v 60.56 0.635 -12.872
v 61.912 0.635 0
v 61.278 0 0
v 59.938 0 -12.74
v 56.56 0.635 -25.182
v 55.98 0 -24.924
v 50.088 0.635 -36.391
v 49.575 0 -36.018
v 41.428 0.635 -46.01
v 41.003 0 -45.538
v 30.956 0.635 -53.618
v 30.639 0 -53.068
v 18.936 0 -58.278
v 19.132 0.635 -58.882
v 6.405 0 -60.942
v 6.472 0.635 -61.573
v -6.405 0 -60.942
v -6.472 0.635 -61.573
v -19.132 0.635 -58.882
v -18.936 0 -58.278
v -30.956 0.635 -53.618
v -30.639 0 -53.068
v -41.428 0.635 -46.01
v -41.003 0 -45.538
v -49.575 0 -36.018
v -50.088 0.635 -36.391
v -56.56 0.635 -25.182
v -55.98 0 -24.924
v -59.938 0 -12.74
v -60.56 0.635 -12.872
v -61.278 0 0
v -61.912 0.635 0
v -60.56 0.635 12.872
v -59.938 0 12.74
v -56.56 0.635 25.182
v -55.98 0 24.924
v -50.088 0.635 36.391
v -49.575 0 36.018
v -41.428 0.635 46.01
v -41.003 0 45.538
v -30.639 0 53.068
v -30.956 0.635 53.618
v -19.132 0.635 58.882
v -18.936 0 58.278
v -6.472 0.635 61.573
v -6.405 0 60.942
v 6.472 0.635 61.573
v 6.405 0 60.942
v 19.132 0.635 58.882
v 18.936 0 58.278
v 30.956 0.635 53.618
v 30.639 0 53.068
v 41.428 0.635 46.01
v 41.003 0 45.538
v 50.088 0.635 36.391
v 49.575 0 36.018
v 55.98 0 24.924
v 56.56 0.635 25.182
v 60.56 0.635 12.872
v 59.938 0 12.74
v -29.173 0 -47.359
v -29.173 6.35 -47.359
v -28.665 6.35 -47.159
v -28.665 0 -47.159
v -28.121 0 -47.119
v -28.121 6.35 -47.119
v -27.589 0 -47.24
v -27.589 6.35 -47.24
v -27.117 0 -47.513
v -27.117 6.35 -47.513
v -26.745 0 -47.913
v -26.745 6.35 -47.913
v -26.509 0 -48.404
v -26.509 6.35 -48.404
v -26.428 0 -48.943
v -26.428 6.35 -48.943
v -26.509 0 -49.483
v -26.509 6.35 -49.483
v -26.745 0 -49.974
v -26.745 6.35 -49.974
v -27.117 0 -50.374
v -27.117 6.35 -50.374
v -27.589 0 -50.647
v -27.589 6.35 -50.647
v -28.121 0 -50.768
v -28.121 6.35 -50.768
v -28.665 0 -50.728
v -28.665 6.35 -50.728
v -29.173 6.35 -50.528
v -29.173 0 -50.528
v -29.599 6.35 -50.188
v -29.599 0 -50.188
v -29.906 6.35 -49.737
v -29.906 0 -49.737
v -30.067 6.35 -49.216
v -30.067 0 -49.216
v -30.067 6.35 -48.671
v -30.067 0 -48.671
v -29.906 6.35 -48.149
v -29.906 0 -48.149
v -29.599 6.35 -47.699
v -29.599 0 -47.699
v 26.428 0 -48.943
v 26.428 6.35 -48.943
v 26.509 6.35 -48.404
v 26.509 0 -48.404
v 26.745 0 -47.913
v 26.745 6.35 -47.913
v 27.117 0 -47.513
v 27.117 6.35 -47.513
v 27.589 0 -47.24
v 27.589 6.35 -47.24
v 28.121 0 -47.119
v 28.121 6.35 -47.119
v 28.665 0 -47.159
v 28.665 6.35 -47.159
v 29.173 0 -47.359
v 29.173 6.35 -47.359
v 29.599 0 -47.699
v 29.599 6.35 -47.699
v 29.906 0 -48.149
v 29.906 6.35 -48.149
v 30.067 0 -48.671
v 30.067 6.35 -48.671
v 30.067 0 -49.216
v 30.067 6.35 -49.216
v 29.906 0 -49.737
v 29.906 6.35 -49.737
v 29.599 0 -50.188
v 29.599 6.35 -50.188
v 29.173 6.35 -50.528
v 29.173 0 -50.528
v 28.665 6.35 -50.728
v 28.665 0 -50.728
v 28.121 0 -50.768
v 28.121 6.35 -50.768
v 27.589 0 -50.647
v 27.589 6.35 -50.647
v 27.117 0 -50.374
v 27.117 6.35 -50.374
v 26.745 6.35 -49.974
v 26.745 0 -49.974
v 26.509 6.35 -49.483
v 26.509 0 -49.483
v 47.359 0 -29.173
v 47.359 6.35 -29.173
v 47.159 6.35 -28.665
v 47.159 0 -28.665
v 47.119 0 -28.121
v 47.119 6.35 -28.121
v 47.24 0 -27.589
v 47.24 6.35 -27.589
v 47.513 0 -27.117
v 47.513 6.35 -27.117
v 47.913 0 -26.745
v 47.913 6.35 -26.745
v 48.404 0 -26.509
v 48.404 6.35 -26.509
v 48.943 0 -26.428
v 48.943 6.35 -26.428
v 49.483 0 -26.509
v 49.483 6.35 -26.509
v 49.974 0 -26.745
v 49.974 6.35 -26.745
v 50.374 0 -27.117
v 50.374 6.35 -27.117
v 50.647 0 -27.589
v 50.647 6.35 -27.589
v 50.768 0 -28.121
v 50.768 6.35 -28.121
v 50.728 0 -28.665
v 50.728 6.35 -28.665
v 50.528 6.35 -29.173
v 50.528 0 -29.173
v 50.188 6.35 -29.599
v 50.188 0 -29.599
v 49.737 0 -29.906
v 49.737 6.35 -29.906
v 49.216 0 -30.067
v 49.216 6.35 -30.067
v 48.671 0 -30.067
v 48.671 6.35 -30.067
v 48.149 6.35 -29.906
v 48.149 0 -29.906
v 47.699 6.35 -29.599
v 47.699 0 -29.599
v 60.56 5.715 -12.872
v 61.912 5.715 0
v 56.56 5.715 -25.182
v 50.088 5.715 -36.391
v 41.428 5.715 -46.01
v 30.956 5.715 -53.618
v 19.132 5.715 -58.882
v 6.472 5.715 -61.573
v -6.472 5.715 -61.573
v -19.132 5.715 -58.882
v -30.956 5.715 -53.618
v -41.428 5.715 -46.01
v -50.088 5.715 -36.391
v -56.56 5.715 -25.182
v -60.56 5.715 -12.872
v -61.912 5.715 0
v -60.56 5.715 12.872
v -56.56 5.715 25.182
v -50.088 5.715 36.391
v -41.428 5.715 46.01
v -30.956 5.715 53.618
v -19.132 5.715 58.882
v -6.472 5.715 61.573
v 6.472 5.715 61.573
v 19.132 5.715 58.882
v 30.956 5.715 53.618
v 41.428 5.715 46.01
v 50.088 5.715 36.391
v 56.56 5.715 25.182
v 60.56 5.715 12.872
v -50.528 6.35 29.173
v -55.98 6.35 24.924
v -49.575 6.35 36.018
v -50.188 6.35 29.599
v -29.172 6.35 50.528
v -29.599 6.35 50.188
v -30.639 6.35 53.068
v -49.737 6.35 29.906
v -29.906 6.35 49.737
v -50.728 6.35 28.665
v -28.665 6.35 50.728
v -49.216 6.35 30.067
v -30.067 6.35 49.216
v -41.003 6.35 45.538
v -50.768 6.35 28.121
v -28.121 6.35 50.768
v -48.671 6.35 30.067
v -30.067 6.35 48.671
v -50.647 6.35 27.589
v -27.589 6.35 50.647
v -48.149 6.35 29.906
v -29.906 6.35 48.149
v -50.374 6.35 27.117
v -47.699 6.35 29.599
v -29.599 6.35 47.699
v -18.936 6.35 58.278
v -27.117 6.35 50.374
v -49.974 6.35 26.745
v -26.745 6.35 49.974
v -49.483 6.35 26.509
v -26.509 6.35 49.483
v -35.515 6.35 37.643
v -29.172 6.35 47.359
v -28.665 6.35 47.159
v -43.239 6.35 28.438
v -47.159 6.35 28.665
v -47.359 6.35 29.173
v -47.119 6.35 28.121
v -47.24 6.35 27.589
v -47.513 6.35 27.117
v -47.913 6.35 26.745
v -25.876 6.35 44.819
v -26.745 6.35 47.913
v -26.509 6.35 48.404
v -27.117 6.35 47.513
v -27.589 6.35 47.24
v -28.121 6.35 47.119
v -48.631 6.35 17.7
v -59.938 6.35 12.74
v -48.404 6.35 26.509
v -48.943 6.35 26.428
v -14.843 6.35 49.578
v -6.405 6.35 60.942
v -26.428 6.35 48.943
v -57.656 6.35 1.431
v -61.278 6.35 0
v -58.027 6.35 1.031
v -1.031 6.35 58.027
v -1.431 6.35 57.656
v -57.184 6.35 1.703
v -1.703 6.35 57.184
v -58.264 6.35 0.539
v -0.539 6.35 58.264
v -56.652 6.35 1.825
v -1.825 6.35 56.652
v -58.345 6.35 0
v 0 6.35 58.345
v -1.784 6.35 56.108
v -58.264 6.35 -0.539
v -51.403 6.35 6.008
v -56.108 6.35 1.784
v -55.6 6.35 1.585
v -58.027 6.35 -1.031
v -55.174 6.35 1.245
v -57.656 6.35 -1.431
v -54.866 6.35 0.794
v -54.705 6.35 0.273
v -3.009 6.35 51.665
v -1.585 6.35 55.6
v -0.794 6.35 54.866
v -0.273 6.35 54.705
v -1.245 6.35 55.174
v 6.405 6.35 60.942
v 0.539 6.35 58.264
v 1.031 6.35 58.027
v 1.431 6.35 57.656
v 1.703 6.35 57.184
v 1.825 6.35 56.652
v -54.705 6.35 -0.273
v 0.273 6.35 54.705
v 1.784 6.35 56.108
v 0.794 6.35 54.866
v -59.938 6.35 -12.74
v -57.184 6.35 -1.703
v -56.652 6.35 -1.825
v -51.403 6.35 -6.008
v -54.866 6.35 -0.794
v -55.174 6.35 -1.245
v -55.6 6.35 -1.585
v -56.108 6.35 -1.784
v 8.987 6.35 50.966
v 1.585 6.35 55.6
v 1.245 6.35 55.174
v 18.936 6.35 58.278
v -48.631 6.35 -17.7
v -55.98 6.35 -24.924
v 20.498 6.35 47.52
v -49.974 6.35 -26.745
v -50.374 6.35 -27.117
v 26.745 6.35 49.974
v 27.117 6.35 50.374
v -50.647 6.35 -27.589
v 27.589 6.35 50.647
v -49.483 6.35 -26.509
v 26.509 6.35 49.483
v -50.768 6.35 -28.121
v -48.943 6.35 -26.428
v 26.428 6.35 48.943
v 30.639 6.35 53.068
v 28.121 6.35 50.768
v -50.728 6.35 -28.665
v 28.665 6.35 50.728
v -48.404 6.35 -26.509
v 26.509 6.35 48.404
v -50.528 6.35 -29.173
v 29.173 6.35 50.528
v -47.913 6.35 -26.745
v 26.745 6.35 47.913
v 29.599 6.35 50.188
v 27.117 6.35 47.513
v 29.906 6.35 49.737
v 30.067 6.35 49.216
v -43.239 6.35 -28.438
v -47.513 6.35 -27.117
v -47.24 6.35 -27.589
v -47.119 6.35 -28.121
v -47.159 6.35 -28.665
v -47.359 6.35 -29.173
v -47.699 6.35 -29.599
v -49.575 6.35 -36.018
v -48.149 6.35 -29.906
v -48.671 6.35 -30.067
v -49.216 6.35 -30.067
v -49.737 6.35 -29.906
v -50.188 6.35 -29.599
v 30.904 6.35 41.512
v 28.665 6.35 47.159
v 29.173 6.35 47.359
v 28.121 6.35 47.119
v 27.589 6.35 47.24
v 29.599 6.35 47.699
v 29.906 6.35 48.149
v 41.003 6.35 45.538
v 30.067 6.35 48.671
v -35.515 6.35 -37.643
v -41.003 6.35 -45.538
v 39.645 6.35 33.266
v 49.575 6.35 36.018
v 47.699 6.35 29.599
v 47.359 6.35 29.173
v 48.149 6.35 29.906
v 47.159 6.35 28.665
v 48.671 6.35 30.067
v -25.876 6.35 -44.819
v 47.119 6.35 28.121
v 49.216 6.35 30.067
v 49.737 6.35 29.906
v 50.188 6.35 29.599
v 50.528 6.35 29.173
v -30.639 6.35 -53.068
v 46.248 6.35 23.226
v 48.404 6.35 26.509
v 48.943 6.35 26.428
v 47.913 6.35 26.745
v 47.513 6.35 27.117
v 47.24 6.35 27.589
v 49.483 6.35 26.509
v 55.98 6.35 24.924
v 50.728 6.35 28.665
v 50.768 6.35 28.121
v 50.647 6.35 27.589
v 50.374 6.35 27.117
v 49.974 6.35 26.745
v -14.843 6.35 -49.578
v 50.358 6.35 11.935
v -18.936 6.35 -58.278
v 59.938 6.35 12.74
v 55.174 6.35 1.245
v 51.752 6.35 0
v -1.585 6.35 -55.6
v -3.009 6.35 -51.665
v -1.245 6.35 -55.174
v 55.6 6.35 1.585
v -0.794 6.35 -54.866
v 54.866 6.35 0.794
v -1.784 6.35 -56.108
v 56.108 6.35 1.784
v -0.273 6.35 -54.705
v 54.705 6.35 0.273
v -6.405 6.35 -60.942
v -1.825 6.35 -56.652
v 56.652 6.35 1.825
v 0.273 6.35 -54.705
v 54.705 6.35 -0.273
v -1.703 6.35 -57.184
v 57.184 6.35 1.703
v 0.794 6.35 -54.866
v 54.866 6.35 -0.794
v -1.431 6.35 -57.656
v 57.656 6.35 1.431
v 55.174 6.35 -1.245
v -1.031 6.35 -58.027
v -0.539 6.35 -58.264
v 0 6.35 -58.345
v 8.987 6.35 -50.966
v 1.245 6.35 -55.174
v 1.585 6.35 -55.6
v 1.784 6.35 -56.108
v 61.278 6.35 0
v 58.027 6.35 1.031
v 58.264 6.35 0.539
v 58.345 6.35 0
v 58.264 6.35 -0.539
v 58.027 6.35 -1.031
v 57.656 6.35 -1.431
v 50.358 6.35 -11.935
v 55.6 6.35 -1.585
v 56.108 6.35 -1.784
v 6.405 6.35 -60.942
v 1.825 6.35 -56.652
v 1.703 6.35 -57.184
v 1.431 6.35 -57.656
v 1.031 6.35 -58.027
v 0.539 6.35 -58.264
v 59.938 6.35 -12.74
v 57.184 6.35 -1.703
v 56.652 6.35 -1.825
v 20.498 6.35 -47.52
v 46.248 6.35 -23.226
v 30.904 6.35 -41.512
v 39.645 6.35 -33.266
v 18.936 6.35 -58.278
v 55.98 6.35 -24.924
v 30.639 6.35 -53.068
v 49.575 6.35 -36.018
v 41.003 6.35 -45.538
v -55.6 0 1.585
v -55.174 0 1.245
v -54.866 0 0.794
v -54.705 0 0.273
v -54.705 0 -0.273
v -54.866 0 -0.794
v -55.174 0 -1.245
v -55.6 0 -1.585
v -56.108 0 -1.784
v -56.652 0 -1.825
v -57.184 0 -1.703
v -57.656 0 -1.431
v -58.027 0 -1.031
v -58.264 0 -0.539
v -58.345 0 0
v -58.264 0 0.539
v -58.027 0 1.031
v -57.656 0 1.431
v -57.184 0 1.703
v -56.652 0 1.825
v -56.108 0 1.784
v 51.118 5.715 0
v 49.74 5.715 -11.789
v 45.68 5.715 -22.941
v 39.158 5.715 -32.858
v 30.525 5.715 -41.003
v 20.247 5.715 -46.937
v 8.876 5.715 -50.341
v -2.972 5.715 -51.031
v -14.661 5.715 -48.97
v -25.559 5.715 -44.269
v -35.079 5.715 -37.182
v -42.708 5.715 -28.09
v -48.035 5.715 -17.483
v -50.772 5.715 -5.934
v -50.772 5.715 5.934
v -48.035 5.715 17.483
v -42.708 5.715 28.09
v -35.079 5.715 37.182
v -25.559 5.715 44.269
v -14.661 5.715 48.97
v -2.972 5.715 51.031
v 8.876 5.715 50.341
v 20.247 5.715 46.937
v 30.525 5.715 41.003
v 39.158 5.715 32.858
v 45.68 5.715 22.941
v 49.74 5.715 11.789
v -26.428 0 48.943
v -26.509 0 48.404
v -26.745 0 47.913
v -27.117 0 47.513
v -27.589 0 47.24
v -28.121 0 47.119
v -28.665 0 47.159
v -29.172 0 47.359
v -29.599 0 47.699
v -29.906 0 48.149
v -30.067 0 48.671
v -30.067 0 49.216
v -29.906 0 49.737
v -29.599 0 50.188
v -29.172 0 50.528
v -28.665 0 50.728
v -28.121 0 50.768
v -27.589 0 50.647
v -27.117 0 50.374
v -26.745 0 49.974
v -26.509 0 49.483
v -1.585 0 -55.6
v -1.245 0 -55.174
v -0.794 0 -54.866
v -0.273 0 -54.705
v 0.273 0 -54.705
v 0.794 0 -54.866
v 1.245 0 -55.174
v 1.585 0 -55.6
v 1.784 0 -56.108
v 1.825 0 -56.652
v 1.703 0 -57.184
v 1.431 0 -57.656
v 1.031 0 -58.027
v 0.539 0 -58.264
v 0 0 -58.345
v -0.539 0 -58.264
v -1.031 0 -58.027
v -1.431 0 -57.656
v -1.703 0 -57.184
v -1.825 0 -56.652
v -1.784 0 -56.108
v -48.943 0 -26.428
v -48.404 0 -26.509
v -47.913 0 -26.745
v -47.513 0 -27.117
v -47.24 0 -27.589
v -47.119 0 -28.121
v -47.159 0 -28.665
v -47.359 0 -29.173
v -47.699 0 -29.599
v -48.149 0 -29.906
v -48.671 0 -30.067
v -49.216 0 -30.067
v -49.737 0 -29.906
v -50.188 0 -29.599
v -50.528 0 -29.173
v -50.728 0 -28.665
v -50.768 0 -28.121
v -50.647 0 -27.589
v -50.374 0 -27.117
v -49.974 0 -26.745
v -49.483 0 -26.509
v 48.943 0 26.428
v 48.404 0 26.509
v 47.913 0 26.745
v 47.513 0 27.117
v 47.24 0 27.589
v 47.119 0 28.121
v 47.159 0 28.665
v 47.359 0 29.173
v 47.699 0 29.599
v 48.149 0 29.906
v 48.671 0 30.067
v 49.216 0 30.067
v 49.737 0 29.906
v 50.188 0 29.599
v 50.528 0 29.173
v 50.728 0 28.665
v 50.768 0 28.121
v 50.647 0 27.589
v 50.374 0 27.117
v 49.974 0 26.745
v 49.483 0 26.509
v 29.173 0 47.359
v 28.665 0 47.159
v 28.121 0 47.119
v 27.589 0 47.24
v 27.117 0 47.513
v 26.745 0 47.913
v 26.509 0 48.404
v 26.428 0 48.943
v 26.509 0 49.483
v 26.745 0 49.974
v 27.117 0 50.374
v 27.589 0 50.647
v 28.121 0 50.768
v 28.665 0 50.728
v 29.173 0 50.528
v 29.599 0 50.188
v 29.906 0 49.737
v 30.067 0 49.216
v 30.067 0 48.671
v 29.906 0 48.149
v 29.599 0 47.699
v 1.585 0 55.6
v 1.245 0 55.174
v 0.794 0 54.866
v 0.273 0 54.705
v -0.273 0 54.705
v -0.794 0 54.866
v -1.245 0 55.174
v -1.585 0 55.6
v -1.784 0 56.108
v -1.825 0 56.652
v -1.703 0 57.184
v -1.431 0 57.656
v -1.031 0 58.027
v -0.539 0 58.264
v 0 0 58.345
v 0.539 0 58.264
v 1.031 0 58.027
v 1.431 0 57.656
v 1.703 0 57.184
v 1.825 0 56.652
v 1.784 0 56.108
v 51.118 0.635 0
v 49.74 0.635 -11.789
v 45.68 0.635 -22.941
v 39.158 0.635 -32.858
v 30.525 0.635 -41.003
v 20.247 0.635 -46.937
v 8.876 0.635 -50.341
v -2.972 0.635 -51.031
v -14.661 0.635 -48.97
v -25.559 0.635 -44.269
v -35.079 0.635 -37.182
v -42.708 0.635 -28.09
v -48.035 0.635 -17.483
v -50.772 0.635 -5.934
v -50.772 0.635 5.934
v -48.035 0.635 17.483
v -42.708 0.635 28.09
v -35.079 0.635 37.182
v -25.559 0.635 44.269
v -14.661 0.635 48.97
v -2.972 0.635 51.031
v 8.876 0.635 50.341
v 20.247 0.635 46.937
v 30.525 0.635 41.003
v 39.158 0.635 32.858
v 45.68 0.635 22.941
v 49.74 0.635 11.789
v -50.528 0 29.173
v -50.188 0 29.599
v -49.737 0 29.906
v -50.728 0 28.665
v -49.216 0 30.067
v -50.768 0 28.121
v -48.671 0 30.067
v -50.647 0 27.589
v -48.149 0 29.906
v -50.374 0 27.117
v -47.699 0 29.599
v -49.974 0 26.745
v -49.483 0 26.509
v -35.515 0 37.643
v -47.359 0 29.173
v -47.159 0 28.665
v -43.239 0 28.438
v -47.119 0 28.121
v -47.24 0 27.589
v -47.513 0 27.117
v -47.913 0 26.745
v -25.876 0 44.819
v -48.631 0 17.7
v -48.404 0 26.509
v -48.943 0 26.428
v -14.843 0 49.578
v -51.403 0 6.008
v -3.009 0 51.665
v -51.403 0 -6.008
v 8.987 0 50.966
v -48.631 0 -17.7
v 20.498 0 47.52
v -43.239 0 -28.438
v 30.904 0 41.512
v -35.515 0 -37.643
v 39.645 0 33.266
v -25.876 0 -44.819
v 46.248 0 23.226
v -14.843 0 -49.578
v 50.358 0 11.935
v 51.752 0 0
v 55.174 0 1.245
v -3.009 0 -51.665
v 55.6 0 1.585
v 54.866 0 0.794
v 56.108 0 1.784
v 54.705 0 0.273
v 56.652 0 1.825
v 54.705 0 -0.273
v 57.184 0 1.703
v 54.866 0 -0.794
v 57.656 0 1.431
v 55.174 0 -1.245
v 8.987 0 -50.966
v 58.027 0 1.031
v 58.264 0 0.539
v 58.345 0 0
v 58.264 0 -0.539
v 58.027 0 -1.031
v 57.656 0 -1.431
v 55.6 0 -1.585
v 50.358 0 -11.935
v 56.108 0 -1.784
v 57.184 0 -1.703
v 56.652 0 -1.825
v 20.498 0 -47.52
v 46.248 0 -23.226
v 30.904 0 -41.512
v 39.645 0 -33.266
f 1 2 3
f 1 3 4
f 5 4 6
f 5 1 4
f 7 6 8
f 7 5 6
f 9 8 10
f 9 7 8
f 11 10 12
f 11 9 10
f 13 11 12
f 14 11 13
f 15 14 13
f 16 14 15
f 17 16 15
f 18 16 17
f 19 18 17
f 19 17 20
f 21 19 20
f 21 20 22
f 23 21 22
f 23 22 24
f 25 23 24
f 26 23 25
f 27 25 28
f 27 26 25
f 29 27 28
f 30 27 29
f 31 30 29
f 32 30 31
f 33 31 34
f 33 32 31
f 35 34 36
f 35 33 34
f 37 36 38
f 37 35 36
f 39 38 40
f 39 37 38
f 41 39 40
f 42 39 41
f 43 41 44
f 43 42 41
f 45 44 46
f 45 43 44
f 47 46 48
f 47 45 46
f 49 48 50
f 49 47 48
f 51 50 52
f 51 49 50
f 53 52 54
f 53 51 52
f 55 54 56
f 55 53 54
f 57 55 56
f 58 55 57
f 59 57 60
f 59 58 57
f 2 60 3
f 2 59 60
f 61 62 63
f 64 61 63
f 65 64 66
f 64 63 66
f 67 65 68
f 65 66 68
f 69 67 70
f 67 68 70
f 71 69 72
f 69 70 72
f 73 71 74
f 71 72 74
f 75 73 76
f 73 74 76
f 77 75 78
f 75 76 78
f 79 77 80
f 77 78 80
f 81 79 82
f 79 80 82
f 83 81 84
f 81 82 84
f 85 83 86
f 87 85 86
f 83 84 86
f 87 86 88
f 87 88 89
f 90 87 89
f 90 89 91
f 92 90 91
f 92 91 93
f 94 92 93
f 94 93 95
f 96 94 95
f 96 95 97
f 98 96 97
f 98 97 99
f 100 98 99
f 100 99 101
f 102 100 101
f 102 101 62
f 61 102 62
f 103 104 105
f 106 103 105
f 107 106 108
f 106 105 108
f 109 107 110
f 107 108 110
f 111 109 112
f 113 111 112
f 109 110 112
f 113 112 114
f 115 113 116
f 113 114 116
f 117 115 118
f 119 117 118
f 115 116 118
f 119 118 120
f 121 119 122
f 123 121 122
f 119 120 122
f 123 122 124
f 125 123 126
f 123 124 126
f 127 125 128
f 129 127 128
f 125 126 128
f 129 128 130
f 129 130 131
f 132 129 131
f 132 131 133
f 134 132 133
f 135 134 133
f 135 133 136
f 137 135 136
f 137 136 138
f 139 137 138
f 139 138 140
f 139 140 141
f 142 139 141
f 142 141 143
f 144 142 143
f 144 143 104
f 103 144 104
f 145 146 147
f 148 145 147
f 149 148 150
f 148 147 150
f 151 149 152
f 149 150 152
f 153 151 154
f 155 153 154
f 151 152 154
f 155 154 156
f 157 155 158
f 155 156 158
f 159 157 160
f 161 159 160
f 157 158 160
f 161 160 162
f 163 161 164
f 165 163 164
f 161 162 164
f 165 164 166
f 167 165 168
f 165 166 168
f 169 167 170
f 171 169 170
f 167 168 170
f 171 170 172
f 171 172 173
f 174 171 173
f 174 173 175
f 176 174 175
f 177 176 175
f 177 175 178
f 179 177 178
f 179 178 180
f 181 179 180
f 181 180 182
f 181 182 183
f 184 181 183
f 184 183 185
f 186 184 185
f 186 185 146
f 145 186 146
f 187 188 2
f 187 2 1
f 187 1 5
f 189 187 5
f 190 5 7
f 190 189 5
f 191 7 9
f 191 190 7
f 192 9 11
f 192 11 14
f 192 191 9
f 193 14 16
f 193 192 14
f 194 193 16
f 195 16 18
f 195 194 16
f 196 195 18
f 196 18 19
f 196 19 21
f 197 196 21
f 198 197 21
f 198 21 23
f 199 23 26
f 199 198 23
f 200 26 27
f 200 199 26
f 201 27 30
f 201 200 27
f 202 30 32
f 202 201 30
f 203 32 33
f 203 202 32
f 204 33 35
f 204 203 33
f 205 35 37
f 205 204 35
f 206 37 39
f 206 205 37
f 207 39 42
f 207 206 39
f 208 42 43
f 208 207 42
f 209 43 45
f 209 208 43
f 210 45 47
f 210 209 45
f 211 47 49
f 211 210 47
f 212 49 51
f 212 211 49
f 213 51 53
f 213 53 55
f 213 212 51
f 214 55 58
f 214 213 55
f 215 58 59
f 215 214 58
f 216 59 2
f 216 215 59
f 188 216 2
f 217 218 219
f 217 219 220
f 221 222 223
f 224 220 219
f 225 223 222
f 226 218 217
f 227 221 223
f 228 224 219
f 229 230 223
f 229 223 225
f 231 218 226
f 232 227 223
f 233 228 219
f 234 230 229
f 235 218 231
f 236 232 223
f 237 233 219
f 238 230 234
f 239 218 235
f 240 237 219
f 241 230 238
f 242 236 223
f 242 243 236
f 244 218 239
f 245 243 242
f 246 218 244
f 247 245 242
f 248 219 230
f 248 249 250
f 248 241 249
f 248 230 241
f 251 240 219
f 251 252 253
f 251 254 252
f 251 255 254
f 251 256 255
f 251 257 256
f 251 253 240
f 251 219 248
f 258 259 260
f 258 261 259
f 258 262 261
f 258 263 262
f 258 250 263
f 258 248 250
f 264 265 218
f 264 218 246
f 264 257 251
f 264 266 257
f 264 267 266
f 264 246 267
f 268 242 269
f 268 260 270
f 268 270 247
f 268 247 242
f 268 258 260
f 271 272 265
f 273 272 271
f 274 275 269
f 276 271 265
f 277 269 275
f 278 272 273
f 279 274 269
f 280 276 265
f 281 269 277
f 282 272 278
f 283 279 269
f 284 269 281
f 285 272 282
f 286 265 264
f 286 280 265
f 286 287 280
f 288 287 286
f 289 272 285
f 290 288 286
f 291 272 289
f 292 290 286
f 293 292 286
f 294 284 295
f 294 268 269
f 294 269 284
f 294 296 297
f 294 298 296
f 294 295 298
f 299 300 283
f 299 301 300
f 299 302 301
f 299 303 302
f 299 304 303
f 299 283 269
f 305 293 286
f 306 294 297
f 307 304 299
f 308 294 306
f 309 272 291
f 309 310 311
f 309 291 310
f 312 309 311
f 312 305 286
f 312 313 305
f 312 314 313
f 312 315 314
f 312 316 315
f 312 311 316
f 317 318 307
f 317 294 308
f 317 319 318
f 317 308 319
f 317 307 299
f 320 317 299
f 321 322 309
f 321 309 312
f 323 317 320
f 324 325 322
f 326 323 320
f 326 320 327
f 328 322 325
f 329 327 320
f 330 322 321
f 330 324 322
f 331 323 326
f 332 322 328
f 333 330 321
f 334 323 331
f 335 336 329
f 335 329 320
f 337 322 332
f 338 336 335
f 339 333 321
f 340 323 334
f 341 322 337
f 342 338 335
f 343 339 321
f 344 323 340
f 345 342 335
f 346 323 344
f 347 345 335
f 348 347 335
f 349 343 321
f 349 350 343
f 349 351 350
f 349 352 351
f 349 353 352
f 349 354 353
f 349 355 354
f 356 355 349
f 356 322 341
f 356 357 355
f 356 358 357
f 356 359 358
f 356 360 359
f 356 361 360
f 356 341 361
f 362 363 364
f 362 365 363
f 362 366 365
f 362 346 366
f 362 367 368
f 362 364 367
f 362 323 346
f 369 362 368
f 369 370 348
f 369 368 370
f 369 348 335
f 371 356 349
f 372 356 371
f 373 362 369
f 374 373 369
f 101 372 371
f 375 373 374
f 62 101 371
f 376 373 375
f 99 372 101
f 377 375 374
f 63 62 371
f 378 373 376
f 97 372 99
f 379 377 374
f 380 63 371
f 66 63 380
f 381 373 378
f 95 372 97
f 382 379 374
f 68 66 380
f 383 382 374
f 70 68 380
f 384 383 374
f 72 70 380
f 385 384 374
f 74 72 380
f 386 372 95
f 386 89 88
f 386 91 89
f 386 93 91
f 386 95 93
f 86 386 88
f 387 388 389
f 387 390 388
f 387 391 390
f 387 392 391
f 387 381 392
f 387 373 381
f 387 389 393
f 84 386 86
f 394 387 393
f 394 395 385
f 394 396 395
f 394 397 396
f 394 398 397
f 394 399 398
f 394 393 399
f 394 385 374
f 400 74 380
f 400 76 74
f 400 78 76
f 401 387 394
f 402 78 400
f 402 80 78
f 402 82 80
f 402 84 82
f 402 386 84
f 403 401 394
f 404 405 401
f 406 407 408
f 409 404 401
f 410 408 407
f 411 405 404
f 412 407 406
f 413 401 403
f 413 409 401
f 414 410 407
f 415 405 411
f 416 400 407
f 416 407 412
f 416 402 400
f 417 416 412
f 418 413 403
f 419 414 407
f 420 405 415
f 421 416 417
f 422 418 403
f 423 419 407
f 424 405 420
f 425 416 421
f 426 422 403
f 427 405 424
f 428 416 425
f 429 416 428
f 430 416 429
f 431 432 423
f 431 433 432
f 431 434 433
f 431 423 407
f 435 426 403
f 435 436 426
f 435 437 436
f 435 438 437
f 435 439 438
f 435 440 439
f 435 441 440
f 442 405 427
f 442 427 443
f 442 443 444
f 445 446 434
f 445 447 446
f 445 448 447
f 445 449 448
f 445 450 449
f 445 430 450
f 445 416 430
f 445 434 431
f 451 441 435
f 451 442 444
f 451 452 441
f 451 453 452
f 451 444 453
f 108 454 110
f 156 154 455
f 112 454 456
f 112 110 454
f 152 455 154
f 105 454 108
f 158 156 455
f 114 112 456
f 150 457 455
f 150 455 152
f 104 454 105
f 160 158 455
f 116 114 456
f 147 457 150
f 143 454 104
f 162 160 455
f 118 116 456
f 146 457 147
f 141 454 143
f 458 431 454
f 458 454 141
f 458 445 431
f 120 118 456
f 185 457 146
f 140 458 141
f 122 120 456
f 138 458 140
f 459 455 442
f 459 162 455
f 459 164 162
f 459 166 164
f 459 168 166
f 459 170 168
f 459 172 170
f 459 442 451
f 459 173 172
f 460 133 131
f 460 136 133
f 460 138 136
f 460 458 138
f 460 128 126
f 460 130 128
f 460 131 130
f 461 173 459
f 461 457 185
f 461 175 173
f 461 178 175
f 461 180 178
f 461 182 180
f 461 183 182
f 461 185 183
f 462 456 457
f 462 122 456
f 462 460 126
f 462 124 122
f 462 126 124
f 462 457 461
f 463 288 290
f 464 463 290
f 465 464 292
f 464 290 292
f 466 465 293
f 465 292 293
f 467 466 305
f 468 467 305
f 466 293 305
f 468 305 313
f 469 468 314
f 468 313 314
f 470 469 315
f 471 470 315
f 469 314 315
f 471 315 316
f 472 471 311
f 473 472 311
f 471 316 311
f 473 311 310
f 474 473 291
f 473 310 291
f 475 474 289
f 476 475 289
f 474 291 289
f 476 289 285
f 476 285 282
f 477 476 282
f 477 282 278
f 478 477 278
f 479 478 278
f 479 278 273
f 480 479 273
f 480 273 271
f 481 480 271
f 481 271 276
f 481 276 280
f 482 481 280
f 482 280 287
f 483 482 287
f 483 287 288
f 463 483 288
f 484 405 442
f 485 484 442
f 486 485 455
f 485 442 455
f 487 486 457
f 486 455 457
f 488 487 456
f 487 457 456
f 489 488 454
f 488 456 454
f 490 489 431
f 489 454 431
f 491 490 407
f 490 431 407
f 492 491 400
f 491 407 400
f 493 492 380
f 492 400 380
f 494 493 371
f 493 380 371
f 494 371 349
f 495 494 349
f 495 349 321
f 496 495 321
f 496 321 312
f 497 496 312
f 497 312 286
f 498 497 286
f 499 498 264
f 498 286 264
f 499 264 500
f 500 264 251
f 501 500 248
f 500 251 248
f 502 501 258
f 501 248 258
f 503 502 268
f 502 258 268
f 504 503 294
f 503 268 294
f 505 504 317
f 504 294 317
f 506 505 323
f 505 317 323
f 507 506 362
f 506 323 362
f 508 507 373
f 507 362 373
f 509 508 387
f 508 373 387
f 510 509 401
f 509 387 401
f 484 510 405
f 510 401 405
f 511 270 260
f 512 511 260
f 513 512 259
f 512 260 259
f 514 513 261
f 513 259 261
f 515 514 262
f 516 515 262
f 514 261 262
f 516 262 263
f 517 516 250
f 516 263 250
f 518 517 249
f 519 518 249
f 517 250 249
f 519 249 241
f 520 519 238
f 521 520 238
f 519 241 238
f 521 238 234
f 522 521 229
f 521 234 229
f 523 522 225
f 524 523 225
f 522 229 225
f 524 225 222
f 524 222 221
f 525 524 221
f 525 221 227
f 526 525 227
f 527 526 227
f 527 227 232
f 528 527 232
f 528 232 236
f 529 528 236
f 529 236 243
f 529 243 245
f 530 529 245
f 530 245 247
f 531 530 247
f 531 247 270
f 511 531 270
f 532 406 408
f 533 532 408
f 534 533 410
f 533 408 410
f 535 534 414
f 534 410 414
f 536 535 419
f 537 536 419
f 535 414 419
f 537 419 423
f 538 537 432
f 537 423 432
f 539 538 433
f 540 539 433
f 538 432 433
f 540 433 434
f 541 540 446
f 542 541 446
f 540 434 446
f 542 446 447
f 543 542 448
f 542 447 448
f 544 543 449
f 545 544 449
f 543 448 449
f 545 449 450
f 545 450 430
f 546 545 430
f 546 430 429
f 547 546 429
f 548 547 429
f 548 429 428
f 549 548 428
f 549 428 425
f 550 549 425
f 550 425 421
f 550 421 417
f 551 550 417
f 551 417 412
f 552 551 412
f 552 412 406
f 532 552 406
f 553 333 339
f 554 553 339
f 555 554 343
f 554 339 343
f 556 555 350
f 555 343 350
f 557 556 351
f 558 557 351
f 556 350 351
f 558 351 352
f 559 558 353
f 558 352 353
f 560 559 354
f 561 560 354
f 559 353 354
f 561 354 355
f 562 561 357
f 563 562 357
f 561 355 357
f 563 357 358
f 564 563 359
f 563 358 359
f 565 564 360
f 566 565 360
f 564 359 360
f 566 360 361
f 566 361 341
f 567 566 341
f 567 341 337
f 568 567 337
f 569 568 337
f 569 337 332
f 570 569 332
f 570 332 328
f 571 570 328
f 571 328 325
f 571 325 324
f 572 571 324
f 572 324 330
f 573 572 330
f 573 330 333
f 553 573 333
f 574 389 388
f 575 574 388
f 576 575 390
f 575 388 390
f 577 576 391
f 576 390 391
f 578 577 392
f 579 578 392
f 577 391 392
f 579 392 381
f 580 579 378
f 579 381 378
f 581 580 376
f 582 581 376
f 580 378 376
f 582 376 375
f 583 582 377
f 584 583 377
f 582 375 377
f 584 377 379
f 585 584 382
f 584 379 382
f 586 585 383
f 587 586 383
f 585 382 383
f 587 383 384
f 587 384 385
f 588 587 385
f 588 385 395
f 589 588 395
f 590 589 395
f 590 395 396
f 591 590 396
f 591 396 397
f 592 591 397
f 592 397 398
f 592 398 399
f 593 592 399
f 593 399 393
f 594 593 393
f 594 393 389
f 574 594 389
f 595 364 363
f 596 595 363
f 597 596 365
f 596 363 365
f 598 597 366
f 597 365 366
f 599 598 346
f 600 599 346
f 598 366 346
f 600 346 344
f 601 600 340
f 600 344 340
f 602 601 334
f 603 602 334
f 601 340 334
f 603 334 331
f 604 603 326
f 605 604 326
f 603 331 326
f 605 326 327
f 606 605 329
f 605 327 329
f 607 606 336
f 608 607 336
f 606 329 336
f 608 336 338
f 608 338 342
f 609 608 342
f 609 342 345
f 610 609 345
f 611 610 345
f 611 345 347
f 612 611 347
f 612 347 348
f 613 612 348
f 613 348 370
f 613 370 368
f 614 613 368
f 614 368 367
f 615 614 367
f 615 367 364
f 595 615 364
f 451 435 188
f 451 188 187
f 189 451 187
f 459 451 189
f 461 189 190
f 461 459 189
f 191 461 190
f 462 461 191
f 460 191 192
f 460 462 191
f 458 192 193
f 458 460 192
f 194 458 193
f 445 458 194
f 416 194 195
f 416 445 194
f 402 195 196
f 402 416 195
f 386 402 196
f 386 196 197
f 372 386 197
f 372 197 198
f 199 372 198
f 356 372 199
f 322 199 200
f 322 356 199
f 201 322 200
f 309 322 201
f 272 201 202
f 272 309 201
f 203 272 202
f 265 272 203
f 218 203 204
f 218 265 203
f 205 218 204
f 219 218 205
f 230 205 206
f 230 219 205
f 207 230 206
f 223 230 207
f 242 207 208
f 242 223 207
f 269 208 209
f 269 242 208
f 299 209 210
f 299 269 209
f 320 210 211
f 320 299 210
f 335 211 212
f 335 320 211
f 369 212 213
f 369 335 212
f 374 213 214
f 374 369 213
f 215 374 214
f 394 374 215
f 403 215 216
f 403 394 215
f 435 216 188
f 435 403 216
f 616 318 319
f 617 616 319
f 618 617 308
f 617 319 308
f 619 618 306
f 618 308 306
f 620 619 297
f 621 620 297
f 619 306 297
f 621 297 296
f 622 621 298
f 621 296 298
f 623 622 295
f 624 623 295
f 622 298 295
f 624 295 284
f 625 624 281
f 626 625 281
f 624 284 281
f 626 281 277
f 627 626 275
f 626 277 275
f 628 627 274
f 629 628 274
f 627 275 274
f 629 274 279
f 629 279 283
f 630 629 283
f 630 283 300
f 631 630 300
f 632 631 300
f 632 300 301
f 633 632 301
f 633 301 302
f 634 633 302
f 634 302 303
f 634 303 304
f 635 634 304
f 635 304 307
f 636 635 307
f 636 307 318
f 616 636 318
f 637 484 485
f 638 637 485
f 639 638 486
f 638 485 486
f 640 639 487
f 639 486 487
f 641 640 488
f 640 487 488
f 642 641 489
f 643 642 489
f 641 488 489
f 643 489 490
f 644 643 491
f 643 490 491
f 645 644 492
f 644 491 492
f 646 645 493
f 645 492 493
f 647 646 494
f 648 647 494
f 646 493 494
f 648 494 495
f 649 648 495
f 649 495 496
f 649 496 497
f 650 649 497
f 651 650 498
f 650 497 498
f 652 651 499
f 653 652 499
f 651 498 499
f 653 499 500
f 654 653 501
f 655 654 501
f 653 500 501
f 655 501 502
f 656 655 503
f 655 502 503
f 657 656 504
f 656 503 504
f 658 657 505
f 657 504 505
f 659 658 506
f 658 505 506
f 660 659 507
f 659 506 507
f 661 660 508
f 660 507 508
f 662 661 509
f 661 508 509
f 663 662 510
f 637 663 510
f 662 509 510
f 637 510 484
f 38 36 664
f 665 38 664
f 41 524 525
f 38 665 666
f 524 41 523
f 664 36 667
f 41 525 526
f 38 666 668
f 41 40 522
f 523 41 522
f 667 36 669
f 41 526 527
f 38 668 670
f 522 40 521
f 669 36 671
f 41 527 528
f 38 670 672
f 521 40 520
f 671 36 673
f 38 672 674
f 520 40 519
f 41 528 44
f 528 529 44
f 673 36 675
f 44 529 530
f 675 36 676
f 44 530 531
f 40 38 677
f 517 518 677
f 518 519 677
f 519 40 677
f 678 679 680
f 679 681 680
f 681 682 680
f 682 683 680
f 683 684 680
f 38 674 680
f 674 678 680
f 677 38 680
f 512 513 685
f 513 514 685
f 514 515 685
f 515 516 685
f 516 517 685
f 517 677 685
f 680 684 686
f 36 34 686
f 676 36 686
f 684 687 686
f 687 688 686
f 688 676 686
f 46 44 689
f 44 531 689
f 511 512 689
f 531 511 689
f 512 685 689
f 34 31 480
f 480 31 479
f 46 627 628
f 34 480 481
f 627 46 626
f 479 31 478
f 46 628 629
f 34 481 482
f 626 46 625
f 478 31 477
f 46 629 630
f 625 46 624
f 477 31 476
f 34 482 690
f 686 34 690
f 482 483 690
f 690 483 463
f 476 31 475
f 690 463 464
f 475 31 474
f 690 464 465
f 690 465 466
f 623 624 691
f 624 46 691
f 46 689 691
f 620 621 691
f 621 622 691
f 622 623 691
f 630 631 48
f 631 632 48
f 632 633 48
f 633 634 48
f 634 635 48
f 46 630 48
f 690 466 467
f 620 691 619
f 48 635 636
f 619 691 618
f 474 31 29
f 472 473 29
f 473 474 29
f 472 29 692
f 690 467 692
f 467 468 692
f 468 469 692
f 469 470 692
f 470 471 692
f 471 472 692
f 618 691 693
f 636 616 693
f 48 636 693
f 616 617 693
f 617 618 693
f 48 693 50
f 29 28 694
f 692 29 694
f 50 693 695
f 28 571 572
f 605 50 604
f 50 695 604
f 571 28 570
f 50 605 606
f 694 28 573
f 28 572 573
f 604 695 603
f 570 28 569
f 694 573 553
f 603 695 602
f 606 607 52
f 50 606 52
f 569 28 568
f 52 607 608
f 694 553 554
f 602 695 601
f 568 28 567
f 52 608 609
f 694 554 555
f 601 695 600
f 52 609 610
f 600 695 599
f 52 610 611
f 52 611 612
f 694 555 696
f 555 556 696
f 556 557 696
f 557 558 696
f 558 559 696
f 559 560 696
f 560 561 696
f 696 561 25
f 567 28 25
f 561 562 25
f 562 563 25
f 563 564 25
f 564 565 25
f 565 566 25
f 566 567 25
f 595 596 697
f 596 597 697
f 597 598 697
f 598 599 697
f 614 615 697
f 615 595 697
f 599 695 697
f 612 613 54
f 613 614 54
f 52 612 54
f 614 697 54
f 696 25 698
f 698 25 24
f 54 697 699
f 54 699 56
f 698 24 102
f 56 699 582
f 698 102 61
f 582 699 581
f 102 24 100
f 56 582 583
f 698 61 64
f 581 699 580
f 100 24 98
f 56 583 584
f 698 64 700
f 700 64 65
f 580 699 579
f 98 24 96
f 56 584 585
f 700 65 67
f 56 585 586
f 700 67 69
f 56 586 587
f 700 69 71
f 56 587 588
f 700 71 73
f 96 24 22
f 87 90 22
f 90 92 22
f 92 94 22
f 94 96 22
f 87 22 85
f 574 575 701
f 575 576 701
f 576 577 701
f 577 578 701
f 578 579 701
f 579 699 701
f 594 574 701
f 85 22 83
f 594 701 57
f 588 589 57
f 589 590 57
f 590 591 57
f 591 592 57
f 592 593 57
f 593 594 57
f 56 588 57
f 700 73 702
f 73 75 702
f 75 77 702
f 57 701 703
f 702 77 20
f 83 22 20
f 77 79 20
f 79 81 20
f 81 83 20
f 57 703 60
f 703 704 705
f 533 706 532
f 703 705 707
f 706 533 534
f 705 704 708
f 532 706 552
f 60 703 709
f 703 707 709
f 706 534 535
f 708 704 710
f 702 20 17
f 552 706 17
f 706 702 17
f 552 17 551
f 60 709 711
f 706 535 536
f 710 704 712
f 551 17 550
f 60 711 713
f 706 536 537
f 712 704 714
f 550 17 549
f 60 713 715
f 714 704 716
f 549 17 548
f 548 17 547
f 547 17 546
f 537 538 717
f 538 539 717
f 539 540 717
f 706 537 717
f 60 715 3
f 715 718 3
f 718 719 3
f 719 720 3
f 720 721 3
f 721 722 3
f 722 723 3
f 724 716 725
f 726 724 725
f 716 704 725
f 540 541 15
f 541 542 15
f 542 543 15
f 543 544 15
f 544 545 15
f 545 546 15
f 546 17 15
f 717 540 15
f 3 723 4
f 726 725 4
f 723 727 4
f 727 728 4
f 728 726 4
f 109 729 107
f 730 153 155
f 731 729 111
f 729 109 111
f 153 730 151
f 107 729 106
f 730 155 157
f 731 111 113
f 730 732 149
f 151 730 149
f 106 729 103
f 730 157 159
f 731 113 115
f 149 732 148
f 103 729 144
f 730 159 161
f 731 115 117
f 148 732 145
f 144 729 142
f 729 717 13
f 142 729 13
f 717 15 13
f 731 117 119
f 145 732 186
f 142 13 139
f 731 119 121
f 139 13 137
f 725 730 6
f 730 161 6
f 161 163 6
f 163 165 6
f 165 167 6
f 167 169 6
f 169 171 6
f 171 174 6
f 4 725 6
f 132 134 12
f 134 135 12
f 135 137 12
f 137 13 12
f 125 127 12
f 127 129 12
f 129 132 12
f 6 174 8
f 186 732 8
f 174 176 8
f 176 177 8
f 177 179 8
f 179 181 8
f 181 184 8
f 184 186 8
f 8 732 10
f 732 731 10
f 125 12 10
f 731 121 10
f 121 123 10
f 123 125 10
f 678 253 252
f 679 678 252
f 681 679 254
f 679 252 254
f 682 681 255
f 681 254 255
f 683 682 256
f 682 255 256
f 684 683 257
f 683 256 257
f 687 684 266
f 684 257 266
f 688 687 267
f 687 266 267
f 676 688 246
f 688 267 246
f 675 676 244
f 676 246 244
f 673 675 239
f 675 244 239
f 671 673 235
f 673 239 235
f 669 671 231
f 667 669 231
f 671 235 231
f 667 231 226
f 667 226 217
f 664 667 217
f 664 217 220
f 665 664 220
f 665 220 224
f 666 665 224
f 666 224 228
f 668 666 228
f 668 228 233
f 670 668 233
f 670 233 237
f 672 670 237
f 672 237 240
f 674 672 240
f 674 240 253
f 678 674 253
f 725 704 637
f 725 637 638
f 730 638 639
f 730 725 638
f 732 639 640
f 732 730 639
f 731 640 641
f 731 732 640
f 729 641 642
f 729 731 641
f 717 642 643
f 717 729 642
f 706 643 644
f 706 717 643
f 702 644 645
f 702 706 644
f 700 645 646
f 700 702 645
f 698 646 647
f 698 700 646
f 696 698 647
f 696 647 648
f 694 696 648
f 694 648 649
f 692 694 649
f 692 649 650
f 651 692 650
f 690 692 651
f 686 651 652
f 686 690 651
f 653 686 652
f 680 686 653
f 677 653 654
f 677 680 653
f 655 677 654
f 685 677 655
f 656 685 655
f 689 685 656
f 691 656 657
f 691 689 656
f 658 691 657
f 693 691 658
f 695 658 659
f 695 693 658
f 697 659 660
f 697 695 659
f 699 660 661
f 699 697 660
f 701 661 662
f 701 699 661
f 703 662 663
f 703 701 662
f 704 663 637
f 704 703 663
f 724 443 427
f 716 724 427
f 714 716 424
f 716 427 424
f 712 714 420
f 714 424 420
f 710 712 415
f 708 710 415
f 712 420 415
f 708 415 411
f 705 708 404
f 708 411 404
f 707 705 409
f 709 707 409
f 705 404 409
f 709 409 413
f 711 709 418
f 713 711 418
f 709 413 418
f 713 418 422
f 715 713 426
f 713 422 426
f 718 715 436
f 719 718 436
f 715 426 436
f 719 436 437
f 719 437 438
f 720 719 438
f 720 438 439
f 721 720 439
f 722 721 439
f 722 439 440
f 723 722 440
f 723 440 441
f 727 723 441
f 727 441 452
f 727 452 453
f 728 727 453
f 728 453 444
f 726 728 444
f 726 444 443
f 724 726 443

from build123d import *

# Parameters (mm, degrees)
SKETCH1_R           = 61.9125
SKETCH1_R_2         = 51.1175
BOSS_EXTRUDE1_DEPTH = 6.35
CHAMFER1_SIZE       = 0.635
CHAMFER2_SIZE       = 0.635
HOLE1_D             = 3.66
CIRPATTERN1_COUNT   = 12
CHAMFER3_SIZE       = 0.635
CHAMFER4_SIZE       = 0.635


with BuildPart() as part:
    # Sketch1 → Boss-Extrude1 (new body)
    with BuildSketch(Plane(origin=(0, 6.35, 0), x_dir=(1, 0, 0), z_dir=(0, 1, 0))):
        Circle(SKETCH1_R)
        Circle(SKETCH1_R_2, mode=Mode.SUBTRACT)
    extrude(amount=-BOSS_EXTRUDE1_DEPTH)

    # Chamfer1
    chamfer1_edges = [part.edges().sort_by_distance(p)[0] for p in [
        (-51.1175, 0, 0),
    ]]
    chamfer(chamfer1_edges, length=CHAMFER1_SIZE)

    # Chamfer2
    chamfer2_edges = [part.edges().sort_by_distance(p)[0] for p in [
        (-51.1175, 6.35, 0),
    ]]
    chamfer(chamfer2_edges, length=CHAMFER2_SIZE)

    # Hole1 (through all)
    with Locations(Plane(origin=(0, 0, 0), x_dir=(-1, 0, 0), z_dir=(0, -1, 0))):
        with Locations((28.2575, -48.943425695)):
            hole1 = Hole(HOLE1_D / 2)

    # CirPattern1: Hole1 ×12 about axis
    cirpattern1_axis = Axis((0, -96.825, 0), (0, 1, 0))
    for i in range(1, CIRPATTERN1_COUNT):
        add(hole1.rotate(cirpattern1_axis, i * 360 / CIRPATTERN1_COUNT), mode=Mode.SUBTRACT)

    # Chamfer3
    chamfer3_edges = [part.edges().sort_by_distance(p)[0] for p in [
        (-61.9125, 0, 0),
    ]]
    chamfer(chamfer3_edges, length=CHAMFER3_SIZE)

    # Chamfer4
    chamfer4_edges = [part.edges().sort_by_distance(p)[0] for p in [
        (-61.9125, 6.35, 0),
    ]]
    chamfer(chamfer4_edges, length=CHAMFER4_SIZE)


solid = part.part
